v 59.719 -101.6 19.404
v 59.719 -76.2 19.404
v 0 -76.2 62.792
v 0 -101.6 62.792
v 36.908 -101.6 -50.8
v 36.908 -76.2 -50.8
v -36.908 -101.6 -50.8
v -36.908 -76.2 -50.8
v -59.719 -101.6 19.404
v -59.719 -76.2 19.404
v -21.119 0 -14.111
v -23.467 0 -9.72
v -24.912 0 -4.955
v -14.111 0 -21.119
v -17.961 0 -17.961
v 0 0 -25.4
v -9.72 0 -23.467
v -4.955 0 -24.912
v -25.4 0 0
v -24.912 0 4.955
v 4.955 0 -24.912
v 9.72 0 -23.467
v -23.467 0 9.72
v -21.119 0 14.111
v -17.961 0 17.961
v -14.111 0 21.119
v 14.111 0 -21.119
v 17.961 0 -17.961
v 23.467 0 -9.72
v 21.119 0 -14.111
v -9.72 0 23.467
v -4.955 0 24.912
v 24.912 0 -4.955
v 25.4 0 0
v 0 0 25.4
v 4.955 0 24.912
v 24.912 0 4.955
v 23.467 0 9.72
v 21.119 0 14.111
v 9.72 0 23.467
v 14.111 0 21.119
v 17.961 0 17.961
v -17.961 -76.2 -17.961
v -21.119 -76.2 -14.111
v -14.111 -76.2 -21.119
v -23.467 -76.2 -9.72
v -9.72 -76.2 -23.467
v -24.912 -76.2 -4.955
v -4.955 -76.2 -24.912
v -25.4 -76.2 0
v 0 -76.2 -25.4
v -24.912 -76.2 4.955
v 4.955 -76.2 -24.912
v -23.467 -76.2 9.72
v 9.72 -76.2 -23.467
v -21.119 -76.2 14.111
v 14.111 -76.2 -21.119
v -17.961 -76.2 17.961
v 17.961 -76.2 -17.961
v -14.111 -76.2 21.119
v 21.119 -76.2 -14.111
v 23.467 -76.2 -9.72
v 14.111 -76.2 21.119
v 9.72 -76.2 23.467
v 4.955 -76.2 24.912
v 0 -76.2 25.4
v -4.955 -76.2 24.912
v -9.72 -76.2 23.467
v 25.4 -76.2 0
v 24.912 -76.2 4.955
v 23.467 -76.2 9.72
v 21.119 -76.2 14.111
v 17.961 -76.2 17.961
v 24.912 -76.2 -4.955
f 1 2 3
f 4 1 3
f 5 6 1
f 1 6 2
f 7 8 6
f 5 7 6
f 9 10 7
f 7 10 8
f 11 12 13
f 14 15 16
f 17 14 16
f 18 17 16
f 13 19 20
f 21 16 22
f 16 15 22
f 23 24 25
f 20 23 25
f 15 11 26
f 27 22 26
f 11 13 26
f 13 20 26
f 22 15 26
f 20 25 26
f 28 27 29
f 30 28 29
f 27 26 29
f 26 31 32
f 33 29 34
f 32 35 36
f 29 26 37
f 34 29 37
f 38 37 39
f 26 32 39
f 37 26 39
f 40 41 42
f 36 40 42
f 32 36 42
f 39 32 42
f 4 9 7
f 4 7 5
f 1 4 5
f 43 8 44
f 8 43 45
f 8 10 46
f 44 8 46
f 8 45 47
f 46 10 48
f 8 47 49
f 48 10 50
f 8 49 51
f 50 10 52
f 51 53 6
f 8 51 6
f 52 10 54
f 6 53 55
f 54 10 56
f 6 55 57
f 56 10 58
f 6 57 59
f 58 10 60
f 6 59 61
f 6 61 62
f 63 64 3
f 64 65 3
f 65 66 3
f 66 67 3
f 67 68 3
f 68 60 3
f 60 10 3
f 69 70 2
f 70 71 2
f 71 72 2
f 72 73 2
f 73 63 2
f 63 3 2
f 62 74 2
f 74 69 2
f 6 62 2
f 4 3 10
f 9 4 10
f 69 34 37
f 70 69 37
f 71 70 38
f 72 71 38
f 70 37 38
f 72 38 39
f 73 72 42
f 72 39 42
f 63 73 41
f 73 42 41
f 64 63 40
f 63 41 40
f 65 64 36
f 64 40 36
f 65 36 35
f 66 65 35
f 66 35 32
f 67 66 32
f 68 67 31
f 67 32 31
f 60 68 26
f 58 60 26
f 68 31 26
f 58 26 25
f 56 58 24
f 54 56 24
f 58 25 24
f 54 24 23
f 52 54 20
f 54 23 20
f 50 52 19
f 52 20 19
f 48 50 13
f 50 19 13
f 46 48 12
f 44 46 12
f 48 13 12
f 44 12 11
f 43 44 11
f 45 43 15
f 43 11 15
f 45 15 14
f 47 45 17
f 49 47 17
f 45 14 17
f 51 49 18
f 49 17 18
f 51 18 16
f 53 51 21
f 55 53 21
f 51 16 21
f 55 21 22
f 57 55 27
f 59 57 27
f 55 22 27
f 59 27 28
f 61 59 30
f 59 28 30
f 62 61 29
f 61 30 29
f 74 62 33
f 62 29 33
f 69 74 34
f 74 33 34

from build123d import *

# Parameters (mm, degrees)
F0_R     = 25.4
F1_DEPTH = 76.2
F3_DEPTH = 25.4


with BuildPart() as f1:
    # F0 (on Front) → F1 (new body)
    with BuildSketch(Plane.XZ):
        Circle(F0_R)
    extrude(amount=F1_DEPTH)

    # F2 (on face) → F3 (join)
    with BuildSketch(Plane.XZ.offset(76.2)):
        Polygon((36.90836, -50.8), (59.718982, 19.403873), (0, 62.792253), (-59.718982, 19.403873), (-36.90836, -50.8), align=None)
    extrude(amount=F3_DEPTH)


solid = f1.part
